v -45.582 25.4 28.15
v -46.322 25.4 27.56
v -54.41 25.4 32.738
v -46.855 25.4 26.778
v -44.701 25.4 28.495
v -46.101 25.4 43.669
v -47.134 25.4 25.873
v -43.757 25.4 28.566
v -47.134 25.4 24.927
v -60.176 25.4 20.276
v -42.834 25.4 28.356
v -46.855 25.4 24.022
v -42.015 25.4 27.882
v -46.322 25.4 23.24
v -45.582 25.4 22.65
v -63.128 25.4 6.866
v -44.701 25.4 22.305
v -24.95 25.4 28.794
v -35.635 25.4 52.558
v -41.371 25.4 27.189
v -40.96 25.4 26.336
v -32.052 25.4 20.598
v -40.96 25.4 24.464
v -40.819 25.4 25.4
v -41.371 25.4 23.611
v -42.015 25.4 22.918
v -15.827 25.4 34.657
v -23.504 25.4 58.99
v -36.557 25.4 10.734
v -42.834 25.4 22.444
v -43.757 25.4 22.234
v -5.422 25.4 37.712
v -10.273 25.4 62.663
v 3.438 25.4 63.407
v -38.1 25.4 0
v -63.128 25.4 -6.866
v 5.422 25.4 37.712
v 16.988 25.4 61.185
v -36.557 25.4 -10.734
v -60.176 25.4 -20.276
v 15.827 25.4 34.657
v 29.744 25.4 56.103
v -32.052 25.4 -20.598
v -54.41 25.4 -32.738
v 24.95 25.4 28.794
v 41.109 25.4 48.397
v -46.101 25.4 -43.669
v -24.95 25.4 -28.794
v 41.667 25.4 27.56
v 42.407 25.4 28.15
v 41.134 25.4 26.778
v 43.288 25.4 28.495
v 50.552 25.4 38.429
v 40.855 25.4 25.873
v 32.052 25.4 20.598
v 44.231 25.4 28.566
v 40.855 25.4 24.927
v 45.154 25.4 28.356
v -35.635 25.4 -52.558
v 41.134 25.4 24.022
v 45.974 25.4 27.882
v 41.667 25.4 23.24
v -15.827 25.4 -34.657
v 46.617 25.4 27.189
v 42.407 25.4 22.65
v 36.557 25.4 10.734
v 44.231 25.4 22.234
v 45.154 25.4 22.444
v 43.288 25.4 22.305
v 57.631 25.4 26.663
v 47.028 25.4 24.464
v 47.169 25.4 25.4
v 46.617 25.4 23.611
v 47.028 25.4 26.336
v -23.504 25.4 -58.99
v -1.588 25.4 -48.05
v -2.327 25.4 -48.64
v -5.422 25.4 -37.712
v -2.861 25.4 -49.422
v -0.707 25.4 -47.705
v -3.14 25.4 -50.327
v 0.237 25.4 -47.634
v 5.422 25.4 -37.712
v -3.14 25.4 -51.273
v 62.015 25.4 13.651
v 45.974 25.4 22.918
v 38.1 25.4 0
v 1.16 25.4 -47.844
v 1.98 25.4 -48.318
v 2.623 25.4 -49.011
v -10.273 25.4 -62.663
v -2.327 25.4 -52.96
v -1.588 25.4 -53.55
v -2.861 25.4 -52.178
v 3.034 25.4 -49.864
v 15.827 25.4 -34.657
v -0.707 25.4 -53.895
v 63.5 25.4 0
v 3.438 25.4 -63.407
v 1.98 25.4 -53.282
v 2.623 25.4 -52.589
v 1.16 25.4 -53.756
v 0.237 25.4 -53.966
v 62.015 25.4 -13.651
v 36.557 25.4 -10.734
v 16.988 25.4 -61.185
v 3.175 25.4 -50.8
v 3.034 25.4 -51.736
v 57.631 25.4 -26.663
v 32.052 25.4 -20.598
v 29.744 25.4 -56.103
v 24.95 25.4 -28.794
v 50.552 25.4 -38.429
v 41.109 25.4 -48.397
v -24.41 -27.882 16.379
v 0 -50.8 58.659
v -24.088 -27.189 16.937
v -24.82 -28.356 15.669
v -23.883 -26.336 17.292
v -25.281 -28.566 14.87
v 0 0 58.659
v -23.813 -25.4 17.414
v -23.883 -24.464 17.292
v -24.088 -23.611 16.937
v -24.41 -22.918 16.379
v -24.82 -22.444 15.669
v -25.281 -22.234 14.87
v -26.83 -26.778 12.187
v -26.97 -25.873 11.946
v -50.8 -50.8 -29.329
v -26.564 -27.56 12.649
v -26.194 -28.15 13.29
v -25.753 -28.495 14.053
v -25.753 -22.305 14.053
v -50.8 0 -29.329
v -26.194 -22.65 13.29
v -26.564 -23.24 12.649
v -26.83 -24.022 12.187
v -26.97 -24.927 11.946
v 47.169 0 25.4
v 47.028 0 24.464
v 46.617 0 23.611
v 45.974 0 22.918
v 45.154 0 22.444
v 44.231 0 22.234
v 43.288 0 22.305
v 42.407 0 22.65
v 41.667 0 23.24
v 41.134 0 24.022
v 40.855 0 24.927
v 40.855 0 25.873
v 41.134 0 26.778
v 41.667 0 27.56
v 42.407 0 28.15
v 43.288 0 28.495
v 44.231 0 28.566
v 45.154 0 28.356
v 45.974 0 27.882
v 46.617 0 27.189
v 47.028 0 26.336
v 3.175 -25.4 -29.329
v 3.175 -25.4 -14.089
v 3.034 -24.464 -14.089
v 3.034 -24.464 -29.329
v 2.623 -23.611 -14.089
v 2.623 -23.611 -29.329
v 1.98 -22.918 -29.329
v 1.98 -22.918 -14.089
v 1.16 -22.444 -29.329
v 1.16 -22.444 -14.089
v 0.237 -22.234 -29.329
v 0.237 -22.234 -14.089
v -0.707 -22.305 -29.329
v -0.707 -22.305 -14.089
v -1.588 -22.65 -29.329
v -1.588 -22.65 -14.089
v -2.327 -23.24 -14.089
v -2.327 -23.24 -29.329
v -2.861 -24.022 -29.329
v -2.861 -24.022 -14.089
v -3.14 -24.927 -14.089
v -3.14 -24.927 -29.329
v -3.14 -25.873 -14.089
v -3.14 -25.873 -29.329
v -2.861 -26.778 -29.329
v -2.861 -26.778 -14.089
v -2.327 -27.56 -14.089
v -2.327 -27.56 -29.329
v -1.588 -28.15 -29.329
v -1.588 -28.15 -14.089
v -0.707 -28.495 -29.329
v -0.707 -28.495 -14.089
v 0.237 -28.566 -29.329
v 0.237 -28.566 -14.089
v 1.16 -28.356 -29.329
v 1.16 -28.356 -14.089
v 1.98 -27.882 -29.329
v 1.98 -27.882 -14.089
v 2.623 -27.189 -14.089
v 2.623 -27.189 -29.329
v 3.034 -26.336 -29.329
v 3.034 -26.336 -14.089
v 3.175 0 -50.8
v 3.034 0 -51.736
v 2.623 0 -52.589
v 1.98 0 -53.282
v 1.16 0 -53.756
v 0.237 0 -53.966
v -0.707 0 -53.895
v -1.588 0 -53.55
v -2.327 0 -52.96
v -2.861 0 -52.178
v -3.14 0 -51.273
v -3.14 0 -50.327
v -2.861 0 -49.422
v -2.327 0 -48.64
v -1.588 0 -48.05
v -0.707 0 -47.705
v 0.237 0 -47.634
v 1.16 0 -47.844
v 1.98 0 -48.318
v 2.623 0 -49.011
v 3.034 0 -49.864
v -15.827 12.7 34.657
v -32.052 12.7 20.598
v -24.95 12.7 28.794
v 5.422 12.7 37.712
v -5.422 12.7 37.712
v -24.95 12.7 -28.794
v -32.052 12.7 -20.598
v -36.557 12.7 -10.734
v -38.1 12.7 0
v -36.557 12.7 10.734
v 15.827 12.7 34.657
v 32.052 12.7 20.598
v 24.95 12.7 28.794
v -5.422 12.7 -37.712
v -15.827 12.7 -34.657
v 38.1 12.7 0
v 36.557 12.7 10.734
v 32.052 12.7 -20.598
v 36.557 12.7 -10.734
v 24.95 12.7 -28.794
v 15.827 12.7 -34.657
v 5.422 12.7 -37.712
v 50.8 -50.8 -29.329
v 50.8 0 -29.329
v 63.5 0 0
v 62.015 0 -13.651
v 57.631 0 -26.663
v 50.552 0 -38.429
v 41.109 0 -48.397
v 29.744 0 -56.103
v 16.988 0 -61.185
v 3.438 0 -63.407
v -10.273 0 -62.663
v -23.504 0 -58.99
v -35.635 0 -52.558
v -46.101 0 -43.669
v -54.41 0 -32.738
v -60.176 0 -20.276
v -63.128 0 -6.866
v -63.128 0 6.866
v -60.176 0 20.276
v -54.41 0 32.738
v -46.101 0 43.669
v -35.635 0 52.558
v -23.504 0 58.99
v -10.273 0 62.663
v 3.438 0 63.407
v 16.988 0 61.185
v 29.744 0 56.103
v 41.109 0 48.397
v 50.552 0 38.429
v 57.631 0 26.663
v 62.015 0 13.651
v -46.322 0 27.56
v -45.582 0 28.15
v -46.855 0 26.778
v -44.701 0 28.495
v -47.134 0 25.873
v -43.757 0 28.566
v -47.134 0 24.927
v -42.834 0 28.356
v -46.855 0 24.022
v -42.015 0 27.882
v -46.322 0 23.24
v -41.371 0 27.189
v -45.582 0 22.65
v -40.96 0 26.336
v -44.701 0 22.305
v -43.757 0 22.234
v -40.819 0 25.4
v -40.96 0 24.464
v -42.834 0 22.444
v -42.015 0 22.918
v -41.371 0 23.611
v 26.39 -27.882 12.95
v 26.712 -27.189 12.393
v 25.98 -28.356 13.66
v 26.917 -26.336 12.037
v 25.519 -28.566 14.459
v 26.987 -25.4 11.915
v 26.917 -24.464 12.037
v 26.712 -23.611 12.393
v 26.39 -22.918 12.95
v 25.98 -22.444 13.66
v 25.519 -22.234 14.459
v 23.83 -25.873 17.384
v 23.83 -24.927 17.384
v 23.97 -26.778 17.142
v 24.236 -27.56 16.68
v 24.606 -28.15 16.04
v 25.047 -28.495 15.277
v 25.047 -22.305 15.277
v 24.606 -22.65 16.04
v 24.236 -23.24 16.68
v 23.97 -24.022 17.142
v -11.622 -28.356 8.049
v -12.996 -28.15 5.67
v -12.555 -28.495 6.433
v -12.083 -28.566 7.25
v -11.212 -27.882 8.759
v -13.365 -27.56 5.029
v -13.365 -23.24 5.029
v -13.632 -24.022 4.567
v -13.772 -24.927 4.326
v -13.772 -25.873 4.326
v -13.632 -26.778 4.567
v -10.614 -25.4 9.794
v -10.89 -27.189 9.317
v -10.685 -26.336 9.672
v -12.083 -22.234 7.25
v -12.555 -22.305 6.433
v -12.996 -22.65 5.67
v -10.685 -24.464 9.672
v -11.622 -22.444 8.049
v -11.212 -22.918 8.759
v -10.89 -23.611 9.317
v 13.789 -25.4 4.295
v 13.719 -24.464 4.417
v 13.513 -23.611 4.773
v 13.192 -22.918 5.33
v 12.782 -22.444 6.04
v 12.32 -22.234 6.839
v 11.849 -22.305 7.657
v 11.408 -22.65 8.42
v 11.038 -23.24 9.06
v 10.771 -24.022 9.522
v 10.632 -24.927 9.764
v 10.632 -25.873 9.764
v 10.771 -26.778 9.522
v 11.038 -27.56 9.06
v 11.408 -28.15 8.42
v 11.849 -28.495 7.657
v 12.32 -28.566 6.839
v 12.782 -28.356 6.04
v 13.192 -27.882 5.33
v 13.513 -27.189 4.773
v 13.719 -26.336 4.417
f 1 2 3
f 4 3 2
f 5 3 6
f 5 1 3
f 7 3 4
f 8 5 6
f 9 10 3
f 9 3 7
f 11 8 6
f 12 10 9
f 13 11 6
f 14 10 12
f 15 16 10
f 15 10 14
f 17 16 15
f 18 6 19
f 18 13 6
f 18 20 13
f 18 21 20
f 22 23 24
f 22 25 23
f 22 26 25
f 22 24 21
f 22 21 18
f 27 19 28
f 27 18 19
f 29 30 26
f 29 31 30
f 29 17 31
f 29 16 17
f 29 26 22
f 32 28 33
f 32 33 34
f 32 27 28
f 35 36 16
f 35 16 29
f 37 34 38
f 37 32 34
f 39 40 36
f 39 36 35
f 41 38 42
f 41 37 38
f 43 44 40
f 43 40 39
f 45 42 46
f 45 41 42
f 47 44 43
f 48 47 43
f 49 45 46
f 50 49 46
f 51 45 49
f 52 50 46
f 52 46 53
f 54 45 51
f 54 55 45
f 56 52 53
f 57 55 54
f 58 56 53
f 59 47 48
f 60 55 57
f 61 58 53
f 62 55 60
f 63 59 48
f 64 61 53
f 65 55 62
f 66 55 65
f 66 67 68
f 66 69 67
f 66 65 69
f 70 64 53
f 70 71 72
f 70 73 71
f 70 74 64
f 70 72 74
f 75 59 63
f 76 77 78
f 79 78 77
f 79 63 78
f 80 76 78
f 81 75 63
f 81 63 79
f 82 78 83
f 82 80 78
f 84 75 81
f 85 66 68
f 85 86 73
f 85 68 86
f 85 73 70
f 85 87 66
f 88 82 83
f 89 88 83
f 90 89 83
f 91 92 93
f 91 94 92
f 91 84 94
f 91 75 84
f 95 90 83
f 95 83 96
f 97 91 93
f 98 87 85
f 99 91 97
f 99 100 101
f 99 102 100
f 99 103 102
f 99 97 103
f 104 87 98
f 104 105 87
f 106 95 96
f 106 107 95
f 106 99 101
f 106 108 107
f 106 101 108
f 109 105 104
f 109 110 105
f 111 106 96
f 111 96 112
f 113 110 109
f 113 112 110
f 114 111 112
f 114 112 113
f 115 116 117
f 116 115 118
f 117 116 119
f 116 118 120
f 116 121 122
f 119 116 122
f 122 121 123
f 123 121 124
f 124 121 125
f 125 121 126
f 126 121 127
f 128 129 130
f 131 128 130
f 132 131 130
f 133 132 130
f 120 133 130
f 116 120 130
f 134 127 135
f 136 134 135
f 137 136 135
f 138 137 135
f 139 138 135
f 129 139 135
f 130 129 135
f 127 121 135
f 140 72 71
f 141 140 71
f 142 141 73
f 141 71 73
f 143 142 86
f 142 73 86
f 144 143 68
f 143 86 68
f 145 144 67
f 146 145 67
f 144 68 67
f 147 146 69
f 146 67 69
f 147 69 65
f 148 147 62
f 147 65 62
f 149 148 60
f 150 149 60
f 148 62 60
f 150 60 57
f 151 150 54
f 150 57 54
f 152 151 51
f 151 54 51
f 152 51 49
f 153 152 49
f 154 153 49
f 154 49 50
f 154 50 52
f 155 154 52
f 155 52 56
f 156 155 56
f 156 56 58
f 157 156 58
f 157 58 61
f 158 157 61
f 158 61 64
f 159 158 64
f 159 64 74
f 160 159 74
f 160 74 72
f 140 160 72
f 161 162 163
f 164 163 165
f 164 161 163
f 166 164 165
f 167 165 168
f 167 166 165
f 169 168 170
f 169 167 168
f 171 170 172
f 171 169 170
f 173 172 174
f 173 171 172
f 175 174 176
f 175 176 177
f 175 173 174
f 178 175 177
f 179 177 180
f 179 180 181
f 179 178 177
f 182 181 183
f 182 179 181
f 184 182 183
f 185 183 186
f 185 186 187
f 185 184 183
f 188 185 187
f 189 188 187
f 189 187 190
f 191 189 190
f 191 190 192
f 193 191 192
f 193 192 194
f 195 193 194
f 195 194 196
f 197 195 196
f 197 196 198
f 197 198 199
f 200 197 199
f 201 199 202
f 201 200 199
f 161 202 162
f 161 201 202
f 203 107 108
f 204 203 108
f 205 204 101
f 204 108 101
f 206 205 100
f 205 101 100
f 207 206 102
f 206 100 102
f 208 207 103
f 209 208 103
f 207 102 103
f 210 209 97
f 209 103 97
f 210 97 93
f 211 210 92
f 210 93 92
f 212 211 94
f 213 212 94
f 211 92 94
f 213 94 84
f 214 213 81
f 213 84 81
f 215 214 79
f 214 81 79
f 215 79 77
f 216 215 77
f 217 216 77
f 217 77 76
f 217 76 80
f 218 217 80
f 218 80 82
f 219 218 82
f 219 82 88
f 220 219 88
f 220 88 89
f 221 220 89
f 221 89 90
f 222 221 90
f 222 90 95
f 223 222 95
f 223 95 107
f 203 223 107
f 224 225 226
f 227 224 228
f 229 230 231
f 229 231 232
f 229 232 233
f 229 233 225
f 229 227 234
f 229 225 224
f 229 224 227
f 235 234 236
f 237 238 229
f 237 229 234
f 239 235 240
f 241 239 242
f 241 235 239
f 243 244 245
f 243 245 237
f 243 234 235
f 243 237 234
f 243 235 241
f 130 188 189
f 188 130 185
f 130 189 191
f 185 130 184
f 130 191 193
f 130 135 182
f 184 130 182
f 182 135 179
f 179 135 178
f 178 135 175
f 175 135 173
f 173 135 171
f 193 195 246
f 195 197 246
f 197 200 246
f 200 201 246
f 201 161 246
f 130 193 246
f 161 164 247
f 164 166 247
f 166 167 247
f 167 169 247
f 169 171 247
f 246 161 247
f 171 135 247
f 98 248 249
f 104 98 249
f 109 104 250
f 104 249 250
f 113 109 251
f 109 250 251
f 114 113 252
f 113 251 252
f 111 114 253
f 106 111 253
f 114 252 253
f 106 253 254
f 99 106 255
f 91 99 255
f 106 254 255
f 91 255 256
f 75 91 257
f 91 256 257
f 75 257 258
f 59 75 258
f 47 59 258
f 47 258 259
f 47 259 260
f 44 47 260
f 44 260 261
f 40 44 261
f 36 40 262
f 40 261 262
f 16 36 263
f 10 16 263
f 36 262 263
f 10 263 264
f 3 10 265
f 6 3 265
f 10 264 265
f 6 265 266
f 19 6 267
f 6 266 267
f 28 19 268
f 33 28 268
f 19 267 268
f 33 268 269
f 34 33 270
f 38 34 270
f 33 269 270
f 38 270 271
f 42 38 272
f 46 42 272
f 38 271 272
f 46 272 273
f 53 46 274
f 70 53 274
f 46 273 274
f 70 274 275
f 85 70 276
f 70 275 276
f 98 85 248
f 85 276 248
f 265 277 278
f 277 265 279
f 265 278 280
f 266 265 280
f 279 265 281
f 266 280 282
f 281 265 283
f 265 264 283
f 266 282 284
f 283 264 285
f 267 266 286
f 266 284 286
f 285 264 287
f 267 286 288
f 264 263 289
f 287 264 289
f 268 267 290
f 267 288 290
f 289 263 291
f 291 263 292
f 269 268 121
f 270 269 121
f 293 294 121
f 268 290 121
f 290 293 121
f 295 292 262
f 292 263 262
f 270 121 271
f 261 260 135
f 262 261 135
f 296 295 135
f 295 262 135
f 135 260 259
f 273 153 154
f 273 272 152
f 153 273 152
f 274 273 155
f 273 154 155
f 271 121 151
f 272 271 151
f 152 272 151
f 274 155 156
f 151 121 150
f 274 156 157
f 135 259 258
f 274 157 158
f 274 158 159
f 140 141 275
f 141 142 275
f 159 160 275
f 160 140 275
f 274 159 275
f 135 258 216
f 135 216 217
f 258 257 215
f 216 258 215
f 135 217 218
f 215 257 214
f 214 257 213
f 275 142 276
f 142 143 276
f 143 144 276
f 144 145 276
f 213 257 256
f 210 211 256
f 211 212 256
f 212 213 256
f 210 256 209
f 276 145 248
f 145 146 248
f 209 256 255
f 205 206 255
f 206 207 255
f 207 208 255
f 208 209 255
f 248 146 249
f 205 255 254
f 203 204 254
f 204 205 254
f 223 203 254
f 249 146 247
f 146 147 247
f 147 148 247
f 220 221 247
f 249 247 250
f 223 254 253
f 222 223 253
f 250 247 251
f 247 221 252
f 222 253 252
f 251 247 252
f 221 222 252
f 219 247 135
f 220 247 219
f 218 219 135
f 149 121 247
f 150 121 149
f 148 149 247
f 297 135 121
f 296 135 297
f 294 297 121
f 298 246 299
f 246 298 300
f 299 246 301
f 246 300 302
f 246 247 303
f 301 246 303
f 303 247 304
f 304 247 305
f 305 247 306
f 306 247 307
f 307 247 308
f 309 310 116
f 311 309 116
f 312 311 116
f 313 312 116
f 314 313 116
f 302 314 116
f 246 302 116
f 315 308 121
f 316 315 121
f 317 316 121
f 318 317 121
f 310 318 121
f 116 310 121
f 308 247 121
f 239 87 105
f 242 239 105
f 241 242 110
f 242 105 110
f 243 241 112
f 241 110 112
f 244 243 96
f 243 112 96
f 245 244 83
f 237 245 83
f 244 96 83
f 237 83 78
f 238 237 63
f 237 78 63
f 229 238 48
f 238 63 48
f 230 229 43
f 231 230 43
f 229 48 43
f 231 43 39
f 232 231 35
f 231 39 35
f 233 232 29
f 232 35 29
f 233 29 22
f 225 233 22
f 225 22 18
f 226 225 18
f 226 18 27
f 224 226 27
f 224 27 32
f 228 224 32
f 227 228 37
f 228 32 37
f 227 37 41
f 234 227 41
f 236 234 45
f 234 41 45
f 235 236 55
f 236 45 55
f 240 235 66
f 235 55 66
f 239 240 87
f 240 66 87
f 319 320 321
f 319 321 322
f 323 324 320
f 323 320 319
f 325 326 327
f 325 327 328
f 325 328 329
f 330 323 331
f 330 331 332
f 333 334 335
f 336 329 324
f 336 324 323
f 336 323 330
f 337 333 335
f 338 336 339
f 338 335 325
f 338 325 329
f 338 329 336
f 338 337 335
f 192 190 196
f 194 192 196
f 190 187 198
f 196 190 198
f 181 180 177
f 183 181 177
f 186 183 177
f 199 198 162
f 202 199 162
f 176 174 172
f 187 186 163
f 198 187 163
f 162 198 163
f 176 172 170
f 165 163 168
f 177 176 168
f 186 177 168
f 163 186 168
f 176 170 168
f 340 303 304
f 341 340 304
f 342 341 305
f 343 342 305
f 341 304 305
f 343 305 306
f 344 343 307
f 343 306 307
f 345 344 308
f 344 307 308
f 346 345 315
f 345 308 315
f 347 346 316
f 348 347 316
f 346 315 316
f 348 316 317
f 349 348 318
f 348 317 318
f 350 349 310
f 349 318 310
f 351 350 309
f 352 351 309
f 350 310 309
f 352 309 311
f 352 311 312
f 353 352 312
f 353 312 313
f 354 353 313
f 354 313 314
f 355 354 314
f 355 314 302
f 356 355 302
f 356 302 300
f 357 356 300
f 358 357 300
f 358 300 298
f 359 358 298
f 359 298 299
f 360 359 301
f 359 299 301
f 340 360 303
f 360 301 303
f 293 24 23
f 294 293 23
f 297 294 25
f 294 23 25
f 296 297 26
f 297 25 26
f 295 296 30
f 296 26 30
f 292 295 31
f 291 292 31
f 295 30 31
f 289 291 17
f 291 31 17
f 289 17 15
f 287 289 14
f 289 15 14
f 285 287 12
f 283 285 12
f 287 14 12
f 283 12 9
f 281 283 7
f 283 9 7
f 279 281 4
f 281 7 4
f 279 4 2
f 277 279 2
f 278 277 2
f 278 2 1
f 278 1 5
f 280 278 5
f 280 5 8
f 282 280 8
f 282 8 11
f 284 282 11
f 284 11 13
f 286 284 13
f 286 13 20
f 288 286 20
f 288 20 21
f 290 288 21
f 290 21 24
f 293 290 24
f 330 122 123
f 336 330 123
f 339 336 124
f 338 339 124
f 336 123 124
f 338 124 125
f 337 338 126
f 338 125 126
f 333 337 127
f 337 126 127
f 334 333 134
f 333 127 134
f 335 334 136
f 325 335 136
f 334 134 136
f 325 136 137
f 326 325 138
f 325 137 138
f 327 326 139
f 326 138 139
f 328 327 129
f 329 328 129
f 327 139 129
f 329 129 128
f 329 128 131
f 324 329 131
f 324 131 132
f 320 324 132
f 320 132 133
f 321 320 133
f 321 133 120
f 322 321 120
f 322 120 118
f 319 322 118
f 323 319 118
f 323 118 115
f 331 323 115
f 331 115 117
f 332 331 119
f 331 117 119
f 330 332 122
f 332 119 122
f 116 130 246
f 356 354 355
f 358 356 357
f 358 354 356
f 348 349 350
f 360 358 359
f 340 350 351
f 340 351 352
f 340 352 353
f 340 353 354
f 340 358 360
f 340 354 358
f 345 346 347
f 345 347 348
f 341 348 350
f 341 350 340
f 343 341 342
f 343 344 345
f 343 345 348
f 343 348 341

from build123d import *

# Parameters (mm, degrees)
SKETCH1_R               = 63.5
BOSS_EXTRUDE1_DEPTH     = 25.4
SKETCH2_R               = 38.1
CUT_EXTRUDE1_DEPTH      = 12.7
BOSS_EXTRUDE2_DEPTH     = 50.8
SKETCH5_R               = 3.175
CUT_EXTRUDE2_DEPTH      = 1
CUT_EXTRUDE2_DEPTH_BACK = 77.2
SKETCH8_R               = 3.175
CUT_EXTRUDE3_DEPTH      = 15.24
SKETCH7_R               = 3.175
CUT_EXTRUDE5_DEPTH      = 15.24
SKETCH6_R               = 3.175
CUT_EXTRUDE6_DEPTH      = 15.24


with BuildPart() as part:
    # Sketch1 → Boss-Extrude1 (new body)
    with BuildSketch(Plane(origin=(0, 0, 0), x_dir=(1, 0, 0), z_dir=(0, 1, 0))):
        Circle(SKETCH1_R)
    extrude(amount=BOSS_EXTRUDE1_DEPTH)

    # Sketch2 → Cut-Extrude1 (cut)
    with BuildSketch(Plane(origin=(0, 25.4, 0), x_dir=(1, 0, 0), z_dir=(0, 1, 0))):
        Circle(SKETCH2_R)
    extrude(amount=-CUT_EXTRUDE1_DEPTH, mode=Mode.SUBTRACT)

    # Sketch4 → Boss-Extrude2 (add)
    with BuildSketch(Plane.XZ):
        Polygon((50.8, -29.329393675), (0, 58.65878735), (-50.8, -29.329393675), align=None)
    extrude(amount=BOSS_EXTRUDE2_DEPTH)

    # Sketch5 → Cut-Extrude2 (cut, two sides)
    with BuildSketch(Plane(origin=(0, 25.4, 0), x_dir=(1, 0, 0), z_dir=(0, 1, 0))) as cut_extrude2_sk:
        with Locations((0, 50.8)):
            Circle(SKETCH5_R)
        with Locations((43.994090512, -25.4)):
            Circle(SKETCH5_R)
        with Locations((-43.994090512, -25.4)):
            Circle(SKETCH5_R)
    extrude(amount=CUT_EXTRUDE2_DEPTH, mode=Mode.SUBTRACT)
    extrude(cut_extrude2_sk.sketch, amount=-CUT_EXTRUDE2_DEPTH_BACK, mode=Mode.SUBTRACT)

    # Sketch8 → Cut-Extrude3 (cut)
    with BuildSketch(Plane(origin=(-25.4, 0, 14.664696837), x_dir=(0.5, 0, 0.866025404), z_dir=(-0.866025404, 0, 0.5))):
        with Locations((0, -25.4)):
            Circle(SKETCH8_R)
    extrude(amount=-CUT_EXTRUDE3_DEPTH, mode=Mode.SUBTRACT)

    # Sketch7 → Cut-Extrude5 (cut)
    with BuildSketch(Plane(origin=(3.754579306, 0, -29.329393675), x_dir=(1, 0, 0), z_dir=(0, 0, 1))):
        with Locations((-3.754579306, -25.4)):
            Circle(SKETCH7_R)
    extrude(amount=CUT_EXTRUDE5_DEPTH, mode=Mode.SUBTRACT)

    # Sketch6 → Cut-Extrude6 (cut)
    with BuildSketch(Plane(origin=(25.4, 0, 14.664696837), x_dir=(0.5, 0, -0.866025404), z_dir=(0.866025404, 0, 0.5))):
        with Locations((0, -25.4)):
            Circle(SKETCH6_R)
    extrude(amount=-CUT_EXTRUDE6_DEPTH, mode=Mode.SUBTRACT)


solid = part.part
